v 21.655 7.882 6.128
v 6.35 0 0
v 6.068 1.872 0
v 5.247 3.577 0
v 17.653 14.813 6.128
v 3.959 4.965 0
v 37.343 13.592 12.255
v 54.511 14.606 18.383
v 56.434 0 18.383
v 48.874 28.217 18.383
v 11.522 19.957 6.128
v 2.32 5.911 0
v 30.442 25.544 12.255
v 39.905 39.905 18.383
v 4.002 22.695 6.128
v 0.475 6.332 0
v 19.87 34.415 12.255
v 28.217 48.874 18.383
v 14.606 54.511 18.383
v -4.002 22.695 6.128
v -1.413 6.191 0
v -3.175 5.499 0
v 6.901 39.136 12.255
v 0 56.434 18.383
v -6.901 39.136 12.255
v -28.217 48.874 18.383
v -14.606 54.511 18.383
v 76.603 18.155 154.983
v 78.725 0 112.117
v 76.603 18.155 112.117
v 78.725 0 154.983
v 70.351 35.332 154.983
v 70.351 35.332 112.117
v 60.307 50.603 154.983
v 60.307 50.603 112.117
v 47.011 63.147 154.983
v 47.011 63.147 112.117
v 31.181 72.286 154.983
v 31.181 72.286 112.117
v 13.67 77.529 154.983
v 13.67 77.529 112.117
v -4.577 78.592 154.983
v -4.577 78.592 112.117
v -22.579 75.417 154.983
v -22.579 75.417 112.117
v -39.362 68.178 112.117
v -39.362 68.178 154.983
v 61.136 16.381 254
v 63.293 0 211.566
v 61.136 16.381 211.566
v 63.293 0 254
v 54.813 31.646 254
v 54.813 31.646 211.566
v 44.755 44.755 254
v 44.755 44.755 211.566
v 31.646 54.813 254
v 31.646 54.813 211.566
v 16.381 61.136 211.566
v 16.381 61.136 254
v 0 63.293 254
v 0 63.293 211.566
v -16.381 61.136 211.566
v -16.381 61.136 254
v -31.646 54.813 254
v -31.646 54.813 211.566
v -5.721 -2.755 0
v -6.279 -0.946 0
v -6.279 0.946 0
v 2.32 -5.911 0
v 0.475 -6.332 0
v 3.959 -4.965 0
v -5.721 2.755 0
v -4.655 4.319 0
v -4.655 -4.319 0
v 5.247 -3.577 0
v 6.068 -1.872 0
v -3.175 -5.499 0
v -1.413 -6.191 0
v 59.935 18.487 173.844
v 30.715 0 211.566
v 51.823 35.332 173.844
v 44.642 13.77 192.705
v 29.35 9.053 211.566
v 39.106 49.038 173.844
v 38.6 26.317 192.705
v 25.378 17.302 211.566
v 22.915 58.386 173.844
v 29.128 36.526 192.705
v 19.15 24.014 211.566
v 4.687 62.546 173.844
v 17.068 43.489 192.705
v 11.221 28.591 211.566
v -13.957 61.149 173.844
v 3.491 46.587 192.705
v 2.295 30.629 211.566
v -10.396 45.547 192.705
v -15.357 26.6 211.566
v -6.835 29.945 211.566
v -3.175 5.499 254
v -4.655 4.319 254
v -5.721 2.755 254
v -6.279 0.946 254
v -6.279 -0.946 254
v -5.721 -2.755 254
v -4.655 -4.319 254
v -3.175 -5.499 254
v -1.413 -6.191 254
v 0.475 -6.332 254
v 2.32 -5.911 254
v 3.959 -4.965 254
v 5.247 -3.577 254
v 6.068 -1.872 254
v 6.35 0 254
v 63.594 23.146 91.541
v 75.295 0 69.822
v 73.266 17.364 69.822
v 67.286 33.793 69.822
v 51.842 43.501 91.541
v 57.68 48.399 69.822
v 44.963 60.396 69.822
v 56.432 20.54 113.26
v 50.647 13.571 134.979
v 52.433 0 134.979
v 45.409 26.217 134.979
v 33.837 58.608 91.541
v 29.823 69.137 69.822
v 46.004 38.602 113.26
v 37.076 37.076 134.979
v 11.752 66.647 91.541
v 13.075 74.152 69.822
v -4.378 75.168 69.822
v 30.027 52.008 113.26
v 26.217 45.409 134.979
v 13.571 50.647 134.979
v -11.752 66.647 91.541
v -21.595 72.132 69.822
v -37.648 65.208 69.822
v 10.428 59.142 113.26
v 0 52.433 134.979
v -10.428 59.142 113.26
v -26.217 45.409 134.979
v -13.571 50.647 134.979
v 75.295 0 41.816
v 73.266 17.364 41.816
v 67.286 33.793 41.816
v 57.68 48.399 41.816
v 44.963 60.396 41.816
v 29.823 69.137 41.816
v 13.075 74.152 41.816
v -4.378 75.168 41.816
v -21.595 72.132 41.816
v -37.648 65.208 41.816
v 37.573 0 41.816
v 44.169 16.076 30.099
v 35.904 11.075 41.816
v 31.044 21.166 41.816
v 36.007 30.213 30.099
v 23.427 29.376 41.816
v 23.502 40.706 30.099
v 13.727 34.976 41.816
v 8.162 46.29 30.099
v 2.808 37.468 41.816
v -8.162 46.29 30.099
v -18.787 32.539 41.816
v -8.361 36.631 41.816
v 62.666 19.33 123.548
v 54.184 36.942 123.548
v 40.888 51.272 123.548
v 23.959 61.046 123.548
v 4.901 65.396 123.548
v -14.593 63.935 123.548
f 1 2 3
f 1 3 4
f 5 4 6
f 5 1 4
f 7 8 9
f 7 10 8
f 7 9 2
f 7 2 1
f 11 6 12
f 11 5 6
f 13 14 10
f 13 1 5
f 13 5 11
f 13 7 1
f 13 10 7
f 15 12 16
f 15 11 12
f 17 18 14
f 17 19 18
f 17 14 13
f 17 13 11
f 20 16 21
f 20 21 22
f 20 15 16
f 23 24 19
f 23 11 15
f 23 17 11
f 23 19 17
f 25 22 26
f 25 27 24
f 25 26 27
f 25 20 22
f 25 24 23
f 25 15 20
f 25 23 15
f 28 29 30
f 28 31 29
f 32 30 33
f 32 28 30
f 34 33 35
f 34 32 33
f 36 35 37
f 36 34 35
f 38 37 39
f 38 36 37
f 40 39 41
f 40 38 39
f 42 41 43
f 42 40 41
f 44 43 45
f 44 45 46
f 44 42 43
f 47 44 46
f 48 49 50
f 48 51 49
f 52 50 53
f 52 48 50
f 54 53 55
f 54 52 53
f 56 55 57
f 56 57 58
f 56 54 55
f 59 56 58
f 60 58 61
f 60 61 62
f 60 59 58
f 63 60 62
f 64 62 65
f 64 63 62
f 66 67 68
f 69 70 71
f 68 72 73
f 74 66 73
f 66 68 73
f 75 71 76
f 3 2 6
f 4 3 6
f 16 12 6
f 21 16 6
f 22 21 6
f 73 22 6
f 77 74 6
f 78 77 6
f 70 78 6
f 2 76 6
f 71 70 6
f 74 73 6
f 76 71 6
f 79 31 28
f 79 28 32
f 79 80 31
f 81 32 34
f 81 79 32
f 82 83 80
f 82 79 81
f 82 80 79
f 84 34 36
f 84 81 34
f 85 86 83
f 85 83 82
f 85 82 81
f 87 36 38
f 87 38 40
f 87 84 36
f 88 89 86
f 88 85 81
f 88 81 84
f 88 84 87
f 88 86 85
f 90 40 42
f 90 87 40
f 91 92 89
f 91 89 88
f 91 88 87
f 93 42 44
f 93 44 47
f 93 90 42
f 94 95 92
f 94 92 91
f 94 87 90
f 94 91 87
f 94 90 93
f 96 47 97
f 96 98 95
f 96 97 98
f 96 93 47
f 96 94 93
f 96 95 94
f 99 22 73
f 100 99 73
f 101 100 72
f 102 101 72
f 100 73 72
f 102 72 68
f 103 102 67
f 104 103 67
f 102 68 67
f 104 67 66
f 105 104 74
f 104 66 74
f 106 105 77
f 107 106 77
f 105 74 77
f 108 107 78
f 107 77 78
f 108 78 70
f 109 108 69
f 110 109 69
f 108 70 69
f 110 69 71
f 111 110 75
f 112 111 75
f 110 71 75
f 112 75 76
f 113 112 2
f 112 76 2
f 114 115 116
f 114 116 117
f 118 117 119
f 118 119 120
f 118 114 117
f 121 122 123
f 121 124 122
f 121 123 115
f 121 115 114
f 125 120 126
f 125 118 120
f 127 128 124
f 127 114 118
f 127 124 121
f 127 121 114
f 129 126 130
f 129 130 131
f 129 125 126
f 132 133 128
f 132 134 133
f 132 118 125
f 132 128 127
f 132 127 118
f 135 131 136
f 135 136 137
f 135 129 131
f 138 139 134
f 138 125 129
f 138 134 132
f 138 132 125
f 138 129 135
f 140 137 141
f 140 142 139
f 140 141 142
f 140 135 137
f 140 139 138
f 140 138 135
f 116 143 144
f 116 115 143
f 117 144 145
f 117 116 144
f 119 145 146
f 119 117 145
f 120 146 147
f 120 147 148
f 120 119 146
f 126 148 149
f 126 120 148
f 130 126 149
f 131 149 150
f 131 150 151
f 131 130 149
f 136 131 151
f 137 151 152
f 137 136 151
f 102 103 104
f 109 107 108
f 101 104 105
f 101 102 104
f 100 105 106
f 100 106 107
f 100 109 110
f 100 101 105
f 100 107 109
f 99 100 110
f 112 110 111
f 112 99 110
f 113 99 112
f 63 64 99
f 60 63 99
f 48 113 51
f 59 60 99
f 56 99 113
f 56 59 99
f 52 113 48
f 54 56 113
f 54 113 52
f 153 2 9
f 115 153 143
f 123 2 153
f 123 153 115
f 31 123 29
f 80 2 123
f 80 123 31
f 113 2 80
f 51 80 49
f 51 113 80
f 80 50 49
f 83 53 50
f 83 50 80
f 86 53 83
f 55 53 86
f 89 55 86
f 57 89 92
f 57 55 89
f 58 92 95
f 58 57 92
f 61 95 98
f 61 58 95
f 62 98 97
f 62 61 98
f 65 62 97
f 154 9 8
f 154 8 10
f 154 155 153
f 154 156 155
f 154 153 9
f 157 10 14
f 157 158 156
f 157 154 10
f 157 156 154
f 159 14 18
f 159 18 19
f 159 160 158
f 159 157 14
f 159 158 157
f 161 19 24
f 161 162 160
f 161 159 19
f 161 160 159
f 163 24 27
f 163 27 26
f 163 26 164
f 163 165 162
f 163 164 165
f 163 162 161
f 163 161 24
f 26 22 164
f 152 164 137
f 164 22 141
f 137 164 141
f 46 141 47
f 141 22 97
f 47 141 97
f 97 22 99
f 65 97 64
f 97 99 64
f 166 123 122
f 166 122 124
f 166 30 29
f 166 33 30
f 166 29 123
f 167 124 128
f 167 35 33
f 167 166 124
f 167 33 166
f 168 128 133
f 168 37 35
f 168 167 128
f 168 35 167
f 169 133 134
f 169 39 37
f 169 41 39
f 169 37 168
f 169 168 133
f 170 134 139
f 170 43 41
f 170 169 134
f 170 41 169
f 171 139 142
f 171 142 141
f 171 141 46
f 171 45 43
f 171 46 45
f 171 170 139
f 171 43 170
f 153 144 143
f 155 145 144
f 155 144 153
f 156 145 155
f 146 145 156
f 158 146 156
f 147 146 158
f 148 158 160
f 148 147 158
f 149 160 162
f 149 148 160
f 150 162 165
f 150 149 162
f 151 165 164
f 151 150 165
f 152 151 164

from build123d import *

# Parameters (mm, degrees)
F0_R     = 6.35
F1_DEPTH = 254
F3_ANGLE = -120


with BuildPart() as f1:
    # F0 (on Top) → F1 (new body)
    with BuildSketch(Plane.XY):
        Circle(F0_R)
    extrude(amount=F1_DEPTH)

    # F2 (on Front) → F3 (revolve)
    with BuildSketch(Plane.XZ):
        Polygon((63.292921, 254), (6.35, 254), (6.35, 0), (56.434337, 18.382614), (37.573218, 41.816123), (75.295448, 41.816123), (75.295448, 69.822021), (52.433491, 134.978592), (78.724734, 112.116635), (78.724734, 154.982805), (30.714633, 211.566135), (63.292921, 211.566135), align=None)
    revolve(axis=Axis((0, 0, 121.26141), (0, 0, -1)), revolution_arc=F3_ANGLE)


solid = f1.part
